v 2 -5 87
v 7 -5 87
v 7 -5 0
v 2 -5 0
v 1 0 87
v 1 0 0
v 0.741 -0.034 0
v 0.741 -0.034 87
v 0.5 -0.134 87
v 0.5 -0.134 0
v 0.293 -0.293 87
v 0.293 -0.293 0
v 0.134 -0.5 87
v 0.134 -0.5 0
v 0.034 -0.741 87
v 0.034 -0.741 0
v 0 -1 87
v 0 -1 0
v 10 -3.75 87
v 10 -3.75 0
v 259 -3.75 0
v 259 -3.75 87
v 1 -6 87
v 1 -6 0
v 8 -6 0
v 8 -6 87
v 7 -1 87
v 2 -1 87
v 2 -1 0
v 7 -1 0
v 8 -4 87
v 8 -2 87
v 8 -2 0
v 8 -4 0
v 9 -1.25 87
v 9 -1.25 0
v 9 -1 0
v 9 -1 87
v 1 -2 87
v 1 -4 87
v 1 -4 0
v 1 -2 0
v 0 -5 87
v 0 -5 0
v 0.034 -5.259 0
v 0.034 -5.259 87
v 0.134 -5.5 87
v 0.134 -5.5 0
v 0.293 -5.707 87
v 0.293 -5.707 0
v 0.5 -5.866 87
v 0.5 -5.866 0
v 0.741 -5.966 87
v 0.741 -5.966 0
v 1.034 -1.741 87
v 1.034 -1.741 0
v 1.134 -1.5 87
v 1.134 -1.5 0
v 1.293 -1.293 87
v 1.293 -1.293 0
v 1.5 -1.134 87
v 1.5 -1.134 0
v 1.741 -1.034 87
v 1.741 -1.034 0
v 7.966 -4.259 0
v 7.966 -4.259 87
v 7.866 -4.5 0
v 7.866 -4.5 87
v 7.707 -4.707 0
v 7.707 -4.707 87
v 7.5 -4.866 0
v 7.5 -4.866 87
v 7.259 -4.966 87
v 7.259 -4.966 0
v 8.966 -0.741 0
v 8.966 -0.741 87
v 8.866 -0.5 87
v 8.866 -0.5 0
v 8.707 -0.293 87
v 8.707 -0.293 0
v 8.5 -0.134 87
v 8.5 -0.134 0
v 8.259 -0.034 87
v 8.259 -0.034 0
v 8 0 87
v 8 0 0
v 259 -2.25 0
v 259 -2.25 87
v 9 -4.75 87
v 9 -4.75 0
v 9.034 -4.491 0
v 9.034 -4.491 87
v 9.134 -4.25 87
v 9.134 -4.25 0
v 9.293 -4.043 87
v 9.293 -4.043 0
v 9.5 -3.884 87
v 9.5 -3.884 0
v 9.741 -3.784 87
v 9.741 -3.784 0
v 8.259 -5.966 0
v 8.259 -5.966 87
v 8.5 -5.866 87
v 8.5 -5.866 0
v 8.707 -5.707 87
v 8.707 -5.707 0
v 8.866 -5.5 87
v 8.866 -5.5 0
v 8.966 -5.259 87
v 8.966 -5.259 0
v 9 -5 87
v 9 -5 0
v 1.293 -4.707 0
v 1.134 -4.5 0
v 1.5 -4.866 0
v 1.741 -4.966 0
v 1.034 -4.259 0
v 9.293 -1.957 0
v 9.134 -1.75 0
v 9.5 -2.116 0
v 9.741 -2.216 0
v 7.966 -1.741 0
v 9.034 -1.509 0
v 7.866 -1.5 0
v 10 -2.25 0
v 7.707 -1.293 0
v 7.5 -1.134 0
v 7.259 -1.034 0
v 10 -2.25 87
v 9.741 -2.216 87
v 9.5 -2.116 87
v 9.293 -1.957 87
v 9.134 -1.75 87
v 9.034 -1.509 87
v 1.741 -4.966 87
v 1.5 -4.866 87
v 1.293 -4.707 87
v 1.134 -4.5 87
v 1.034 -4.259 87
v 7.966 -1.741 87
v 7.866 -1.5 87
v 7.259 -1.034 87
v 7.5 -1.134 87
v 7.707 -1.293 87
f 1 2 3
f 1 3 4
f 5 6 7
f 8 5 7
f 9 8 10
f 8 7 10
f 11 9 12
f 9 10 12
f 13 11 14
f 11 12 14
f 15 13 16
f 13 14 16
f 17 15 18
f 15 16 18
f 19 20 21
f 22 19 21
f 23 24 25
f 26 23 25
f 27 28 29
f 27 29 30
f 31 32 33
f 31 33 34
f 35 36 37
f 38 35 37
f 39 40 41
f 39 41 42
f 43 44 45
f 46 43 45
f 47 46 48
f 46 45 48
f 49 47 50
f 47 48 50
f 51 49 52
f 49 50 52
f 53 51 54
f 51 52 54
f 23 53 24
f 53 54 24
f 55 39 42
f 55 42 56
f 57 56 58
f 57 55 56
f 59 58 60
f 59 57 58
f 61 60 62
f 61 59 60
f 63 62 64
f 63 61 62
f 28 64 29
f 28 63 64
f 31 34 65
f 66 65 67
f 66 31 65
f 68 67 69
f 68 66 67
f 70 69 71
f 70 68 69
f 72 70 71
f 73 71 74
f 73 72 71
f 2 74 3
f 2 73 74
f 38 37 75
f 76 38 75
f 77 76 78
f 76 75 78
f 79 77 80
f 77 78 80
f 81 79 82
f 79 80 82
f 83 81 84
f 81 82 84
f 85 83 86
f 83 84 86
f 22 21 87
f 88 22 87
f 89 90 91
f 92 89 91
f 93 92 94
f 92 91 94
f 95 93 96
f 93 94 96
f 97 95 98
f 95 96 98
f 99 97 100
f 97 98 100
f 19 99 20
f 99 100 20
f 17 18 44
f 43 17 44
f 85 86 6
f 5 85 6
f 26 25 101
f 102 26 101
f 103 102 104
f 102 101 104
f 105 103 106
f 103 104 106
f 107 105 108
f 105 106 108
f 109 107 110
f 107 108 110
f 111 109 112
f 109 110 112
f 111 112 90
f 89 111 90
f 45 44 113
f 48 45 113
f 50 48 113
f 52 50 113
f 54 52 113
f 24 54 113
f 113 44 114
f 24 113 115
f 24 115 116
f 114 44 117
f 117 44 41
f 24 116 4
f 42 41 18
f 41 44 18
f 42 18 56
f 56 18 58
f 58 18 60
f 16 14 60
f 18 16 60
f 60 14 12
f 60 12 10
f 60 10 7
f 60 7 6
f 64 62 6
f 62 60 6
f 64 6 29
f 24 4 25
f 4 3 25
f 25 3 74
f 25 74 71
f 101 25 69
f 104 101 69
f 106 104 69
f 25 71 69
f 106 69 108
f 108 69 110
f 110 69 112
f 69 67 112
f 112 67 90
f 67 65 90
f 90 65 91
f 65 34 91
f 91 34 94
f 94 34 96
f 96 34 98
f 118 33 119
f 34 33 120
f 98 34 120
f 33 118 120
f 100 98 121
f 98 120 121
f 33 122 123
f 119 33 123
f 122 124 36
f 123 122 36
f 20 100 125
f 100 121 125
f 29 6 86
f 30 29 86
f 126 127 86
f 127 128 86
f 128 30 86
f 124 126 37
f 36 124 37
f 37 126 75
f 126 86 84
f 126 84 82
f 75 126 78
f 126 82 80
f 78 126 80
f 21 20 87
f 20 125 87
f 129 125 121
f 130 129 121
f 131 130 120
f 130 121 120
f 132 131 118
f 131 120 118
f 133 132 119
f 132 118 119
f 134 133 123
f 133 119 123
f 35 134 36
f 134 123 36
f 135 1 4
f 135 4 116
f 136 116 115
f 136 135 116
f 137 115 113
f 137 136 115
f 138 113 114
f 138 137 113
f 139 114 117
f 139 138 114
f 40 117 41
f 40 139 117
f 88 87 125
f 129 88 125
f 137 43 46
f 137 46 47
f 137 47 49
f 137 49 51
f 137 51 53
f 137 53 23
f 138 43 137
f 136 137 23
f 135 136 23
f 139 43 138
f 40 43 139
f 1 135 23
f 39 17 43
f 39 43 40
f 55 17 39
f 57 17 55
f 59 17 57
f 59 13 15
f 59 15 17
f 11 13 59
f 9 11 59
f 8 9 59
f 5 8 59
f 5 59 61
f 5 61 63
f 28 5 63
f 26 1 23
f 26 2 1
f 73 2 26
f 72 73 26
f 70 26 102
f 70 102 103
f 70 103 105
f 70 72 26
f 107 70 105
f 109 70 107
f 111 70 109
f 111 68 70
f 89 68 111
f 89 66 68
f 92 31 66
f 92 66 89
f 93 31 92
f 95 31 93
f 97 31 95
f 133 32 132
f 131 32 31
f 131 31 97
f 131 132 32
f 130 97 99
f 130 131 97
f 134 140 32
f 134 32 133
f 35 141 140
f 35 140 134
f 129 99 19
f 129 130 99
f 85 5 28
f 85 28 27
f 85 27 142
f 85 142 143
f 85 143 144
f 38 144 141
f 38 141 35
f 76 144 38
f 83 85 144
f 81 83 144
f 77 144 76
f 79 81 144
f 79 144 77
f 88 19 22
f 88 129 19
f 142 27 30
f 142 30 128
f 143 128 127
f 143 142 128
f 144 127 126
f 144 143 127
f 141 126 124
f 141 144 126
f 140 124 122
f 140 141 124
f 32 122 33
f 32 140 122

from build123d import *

# Parameters (mm, degrees)
EXTRUDE_1_DEPTH     = 87
CUT_EXTRUDE_1_DEPTH = 274.287394514


with BuildPart() as part:
    # 草图1 → 凸台-拉伸1 (new body)
    with BuildSketch(Plane.XY):
        with BuildLine():
            Line((9, -1.25), (9, -1))
            ThreePointArc((9, -1), (8.707106781, -0.292893219), (8, 0))
            Line((8, 0), (1, 0))
            ThreePointArc((1, 0), (0.292893219, -0.292893219), (0, -1))
            Line((0, -1), (0, -5))
            ThreePointArc((0, -5), (0.292893219, -5.707106781), (1, -6))
            Line((1, -6), (8, -6))
            ThreePointArc((8, -6), (8.707106781, -5.707106781), (9, -5))
            Line((9, -5), (9, -4.75))
            ThreePointArc((9, -4.75), (9.292893219, -4.042893219), (10, -3.75))
            Line((10, -3.75), (259, -3.75))
            Line((259, -3.75), (259, -2.25))
            Line((259, -2.25), (10, -2.25))
            ThreePointArc((10, -2.25), (9.292893219, -1.957106781), (9, -1.25))
        make_face()
    extrude(amount=EXTRUDE_1_DEPTH)

    # 草图2 → 切除-拉伸1 (cut, through all)
    with BuildSketch(Plane.XY.offset(87)):
        with BuildLine():
            Line((2, -1), (7, -1))
            ThreePointArc((7, -1), (7.707106781, -1.292893219), (8, -2))
            Line((8, -2), (8, -4))
            ThreePointArc((8, -4), (7.707106781, -4.707106781), (7, -5))
            Line((7, -5), (2, -5))
            ThreePointArc((2, -5), (1.292893219, -4.707106781), (1, -4))
            Line((1, -4), (1, -2))
            ThreePointArc((1, -2), (1.292893219, -1.292893219), (2, -1))
        make_face()
    extrude(amount=-CUT_EXTRUDE_1_DEPTH, mode=Mode.SUBTRACT)


solid = part.part
